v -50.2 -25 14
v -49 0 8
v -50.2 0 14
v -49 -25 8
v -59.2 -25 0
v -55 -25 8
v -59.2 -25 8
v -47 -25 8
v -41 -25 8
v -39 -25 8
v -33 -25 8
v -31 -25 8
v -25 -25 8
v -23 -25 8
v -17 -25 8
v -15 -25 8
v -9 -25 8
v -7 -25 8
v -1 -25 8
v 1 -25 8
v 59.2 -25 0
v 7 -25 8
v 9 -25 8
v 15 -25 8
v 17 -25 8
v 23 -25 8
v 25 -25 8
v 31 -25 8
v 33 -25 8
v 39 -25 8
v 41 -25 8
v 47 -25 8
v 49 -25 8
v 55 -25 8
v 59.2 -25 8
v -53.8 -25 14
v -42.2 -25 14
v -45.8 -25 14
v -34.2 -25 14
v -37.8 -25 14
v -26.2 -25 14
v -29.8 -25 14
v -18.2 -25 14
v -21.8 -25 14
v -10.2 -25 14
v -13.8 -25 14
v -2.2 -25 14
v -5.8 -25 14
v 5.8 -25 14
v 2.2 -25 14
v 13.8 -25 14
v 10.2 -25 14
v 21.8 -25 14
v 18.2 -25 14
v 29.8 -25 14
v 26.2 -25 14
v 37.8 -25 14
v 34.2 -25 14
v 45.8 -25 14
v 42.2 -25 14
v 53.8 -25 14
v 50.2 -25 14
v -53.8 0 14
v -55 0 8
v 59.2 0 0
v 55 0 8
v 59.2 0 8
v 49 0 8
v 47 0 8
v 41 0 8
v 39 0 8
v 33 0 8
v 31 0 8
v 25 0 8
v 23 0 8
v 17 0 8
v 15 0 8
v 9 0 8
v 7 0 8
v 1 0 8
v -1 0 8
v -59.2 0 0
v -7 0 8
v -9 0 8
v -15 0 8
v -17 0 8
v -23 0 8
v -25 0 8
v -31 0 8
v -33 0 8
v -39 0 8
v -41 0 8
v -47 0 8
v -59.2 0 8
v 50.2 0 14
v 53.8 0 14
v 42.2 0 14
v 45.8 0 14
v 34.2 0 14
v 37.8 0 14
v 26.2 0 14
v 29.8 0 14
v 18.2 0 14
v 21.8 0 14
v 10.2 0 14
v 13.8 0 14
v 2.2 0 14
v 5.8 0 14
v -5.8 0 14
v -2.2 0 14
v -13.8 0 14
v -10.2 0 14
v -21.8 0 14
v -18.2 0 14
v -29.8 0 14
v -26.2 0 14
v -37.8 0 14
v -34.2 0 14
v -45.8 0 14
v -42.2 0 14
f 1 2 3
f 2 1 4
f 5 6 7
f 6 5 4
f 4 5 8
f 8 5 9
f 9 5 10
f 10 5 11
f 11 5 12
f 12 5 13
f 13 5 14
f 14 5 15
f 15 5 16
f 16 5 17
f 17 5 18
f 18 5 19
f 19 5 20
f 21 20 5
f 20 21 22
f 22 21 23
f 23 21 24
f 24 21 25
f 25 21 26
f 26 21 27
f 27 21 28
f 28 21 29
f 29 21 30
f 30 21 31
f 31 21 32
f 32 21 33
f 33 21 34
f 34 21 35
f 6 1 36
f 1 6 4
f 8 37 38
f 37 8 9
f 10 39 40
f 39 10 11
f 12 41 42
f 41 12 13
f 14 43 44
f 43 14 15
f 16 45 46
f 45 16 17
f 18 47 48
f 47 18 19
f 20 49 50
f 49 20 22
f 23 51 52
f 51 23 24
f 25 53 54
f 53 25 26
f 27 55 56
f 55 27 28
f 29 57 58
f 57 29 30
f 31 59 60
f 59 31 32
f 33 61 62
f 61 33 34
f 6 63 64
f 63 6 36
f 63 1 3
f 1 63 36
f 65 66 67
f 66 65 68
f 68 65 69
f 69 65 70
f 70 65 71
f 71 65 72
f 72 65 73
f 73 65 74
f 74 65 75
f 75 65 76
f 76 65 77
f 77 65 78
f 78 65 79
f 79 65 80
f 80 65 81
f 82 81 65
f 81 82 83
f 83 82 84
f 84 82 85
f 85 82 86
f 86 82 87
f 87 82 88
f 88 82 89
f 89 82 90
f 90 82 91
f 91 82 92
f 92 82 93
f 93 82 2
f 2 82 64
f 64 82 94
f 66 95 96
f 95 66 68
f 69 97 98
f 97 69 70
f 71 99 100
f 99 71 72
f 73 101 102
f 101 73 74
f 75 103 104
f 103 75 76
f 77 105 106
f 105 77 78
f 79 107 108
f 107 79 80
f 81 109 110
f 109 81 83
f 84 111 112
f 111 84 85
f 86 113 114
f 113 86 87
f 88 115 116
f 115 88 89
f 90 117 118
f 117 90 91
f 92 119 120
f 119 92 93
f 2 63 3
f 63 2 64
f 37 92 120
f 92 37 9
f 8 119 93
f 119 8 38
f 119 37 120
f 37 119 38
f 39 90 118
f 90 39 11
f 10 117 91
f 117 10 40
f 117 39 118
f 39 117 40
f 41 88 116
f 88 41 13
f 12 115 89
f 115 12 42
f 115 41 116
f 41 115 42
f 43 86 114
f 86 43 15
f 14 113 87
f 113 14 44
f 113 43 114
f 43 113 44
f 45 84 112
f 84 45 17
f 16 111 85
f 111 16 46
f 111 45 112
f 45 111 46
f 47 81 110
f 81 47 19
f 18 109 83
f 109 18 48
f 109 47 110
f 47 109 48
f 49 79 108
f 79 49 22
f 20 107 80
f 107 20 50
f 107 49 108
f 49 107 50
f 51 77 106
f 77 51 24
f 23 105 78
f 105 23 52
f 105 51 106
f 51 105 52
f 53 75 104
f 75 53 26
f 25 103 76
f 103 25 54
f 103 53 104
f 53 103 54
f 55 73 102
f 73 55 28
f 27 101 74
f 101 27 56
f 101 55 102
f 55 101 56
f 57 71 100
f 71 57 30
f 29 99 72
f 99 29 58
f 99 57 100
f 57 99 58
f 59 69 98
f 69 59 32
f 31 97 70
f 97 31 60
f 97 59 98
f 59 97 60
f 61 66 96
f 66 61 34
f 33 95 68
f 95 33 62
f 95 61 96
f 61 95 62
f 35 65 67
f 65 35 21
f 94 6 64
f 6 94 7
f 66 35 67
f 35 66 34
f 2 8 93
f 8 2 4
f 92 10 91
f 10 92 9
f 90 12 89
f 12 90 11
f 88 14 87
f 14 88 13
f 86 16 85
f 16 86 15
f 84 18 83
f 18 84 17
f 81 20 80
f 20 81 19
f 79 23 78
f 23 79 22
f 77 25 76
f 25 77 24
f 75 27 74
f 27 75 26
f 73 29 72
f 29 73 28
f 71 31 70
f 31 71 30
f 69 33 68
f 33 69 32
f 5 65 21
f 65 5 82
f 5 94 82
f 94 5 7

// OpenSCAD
$fn = 32;

// ----------------------------------------------------------------------
// Toothed rack, 14 teeth
// 8 mm pitch, 6 mm teeth
// ----------------------------------------------------------------------

// --- parameters (mm) ---
bar_w = 25;     // bar width (Y)
bar_h = 8;      // bar height (Z)
teeth = 14;     // number of teeth
pitch = 8;      // tooth pitch
tooth_h = 6;    // tooth height above the bar
root_w = 6.4;   // tooth width at the root
crest_w = 3.6;  // tooth width at the crest

// --- derived feature positions (mm) ---
span = (teeth - 1) * pitch;  // = 104   distance between the outer teeth
bar_l = span + root_w + 8;   // = 118.4   bar length: teeth plus 4 mm at each end
tooth_x = -span / 2;         // = -52   X of the first tooth
height = bar_h + tooth_h;    // = 14   overall height
feature_centers = [
  [tooth_x + 0 * pitch, -bar_w / 2],
  [tooth_x + 1 * pitch, -bar_w / 2],
  [tooth_x + 2 * pitch, -bar_w / 2],
  [tooth_x + 3 * pitch, -bar_w / 2],
  [tooth_x + 4 * pitch, -bar_w / 2],
  [tooth_x + 5 * pitch, -bar_w / 2],
  [tooth_x + 6 * pitch, -bar_w / 2],
  [tooth_x + 7 * pitch, -bar_w / 2],
  [tooth_x + 8 * pitch, -bar_w / 2],
  [tooth_x + 9 * pitch, -bar_w / 2],
  [tooth_x + 10 * pitch, -bar_w / 2],
  [tooth_x + 11 * pitch, -bar_w / 2],
  [tooth_x + 12 * pitch, -bar_w / 2],
  [tooth_x + 13 * pitch, -bar_w / 2]
];   // tooth centre line, drives the tooth loop

// bar with a rack of teeth, one extruded trapezoium per centre
module rack_tooth() {
  linear_extrude(height = bar_w)
    polygon(points = [
      [0, 0],
      [root_w, 0],
      [root_w / 2 + crest_w / 2, tooth_h + 1],
      [root_w / 2 - crest_w / 2, tooth_h + 1]
    ]);
}

union() {
  translate([-bar_l / 2, -bar_w, 0]) cube([bar_l, bar_w, bar_h]);
  for (centre = feature_centers)
    translate([centre[0] - root_w / 2, 0, bar_h - 1]) rotate([90, 0, 0]) rack_tooth();
}
